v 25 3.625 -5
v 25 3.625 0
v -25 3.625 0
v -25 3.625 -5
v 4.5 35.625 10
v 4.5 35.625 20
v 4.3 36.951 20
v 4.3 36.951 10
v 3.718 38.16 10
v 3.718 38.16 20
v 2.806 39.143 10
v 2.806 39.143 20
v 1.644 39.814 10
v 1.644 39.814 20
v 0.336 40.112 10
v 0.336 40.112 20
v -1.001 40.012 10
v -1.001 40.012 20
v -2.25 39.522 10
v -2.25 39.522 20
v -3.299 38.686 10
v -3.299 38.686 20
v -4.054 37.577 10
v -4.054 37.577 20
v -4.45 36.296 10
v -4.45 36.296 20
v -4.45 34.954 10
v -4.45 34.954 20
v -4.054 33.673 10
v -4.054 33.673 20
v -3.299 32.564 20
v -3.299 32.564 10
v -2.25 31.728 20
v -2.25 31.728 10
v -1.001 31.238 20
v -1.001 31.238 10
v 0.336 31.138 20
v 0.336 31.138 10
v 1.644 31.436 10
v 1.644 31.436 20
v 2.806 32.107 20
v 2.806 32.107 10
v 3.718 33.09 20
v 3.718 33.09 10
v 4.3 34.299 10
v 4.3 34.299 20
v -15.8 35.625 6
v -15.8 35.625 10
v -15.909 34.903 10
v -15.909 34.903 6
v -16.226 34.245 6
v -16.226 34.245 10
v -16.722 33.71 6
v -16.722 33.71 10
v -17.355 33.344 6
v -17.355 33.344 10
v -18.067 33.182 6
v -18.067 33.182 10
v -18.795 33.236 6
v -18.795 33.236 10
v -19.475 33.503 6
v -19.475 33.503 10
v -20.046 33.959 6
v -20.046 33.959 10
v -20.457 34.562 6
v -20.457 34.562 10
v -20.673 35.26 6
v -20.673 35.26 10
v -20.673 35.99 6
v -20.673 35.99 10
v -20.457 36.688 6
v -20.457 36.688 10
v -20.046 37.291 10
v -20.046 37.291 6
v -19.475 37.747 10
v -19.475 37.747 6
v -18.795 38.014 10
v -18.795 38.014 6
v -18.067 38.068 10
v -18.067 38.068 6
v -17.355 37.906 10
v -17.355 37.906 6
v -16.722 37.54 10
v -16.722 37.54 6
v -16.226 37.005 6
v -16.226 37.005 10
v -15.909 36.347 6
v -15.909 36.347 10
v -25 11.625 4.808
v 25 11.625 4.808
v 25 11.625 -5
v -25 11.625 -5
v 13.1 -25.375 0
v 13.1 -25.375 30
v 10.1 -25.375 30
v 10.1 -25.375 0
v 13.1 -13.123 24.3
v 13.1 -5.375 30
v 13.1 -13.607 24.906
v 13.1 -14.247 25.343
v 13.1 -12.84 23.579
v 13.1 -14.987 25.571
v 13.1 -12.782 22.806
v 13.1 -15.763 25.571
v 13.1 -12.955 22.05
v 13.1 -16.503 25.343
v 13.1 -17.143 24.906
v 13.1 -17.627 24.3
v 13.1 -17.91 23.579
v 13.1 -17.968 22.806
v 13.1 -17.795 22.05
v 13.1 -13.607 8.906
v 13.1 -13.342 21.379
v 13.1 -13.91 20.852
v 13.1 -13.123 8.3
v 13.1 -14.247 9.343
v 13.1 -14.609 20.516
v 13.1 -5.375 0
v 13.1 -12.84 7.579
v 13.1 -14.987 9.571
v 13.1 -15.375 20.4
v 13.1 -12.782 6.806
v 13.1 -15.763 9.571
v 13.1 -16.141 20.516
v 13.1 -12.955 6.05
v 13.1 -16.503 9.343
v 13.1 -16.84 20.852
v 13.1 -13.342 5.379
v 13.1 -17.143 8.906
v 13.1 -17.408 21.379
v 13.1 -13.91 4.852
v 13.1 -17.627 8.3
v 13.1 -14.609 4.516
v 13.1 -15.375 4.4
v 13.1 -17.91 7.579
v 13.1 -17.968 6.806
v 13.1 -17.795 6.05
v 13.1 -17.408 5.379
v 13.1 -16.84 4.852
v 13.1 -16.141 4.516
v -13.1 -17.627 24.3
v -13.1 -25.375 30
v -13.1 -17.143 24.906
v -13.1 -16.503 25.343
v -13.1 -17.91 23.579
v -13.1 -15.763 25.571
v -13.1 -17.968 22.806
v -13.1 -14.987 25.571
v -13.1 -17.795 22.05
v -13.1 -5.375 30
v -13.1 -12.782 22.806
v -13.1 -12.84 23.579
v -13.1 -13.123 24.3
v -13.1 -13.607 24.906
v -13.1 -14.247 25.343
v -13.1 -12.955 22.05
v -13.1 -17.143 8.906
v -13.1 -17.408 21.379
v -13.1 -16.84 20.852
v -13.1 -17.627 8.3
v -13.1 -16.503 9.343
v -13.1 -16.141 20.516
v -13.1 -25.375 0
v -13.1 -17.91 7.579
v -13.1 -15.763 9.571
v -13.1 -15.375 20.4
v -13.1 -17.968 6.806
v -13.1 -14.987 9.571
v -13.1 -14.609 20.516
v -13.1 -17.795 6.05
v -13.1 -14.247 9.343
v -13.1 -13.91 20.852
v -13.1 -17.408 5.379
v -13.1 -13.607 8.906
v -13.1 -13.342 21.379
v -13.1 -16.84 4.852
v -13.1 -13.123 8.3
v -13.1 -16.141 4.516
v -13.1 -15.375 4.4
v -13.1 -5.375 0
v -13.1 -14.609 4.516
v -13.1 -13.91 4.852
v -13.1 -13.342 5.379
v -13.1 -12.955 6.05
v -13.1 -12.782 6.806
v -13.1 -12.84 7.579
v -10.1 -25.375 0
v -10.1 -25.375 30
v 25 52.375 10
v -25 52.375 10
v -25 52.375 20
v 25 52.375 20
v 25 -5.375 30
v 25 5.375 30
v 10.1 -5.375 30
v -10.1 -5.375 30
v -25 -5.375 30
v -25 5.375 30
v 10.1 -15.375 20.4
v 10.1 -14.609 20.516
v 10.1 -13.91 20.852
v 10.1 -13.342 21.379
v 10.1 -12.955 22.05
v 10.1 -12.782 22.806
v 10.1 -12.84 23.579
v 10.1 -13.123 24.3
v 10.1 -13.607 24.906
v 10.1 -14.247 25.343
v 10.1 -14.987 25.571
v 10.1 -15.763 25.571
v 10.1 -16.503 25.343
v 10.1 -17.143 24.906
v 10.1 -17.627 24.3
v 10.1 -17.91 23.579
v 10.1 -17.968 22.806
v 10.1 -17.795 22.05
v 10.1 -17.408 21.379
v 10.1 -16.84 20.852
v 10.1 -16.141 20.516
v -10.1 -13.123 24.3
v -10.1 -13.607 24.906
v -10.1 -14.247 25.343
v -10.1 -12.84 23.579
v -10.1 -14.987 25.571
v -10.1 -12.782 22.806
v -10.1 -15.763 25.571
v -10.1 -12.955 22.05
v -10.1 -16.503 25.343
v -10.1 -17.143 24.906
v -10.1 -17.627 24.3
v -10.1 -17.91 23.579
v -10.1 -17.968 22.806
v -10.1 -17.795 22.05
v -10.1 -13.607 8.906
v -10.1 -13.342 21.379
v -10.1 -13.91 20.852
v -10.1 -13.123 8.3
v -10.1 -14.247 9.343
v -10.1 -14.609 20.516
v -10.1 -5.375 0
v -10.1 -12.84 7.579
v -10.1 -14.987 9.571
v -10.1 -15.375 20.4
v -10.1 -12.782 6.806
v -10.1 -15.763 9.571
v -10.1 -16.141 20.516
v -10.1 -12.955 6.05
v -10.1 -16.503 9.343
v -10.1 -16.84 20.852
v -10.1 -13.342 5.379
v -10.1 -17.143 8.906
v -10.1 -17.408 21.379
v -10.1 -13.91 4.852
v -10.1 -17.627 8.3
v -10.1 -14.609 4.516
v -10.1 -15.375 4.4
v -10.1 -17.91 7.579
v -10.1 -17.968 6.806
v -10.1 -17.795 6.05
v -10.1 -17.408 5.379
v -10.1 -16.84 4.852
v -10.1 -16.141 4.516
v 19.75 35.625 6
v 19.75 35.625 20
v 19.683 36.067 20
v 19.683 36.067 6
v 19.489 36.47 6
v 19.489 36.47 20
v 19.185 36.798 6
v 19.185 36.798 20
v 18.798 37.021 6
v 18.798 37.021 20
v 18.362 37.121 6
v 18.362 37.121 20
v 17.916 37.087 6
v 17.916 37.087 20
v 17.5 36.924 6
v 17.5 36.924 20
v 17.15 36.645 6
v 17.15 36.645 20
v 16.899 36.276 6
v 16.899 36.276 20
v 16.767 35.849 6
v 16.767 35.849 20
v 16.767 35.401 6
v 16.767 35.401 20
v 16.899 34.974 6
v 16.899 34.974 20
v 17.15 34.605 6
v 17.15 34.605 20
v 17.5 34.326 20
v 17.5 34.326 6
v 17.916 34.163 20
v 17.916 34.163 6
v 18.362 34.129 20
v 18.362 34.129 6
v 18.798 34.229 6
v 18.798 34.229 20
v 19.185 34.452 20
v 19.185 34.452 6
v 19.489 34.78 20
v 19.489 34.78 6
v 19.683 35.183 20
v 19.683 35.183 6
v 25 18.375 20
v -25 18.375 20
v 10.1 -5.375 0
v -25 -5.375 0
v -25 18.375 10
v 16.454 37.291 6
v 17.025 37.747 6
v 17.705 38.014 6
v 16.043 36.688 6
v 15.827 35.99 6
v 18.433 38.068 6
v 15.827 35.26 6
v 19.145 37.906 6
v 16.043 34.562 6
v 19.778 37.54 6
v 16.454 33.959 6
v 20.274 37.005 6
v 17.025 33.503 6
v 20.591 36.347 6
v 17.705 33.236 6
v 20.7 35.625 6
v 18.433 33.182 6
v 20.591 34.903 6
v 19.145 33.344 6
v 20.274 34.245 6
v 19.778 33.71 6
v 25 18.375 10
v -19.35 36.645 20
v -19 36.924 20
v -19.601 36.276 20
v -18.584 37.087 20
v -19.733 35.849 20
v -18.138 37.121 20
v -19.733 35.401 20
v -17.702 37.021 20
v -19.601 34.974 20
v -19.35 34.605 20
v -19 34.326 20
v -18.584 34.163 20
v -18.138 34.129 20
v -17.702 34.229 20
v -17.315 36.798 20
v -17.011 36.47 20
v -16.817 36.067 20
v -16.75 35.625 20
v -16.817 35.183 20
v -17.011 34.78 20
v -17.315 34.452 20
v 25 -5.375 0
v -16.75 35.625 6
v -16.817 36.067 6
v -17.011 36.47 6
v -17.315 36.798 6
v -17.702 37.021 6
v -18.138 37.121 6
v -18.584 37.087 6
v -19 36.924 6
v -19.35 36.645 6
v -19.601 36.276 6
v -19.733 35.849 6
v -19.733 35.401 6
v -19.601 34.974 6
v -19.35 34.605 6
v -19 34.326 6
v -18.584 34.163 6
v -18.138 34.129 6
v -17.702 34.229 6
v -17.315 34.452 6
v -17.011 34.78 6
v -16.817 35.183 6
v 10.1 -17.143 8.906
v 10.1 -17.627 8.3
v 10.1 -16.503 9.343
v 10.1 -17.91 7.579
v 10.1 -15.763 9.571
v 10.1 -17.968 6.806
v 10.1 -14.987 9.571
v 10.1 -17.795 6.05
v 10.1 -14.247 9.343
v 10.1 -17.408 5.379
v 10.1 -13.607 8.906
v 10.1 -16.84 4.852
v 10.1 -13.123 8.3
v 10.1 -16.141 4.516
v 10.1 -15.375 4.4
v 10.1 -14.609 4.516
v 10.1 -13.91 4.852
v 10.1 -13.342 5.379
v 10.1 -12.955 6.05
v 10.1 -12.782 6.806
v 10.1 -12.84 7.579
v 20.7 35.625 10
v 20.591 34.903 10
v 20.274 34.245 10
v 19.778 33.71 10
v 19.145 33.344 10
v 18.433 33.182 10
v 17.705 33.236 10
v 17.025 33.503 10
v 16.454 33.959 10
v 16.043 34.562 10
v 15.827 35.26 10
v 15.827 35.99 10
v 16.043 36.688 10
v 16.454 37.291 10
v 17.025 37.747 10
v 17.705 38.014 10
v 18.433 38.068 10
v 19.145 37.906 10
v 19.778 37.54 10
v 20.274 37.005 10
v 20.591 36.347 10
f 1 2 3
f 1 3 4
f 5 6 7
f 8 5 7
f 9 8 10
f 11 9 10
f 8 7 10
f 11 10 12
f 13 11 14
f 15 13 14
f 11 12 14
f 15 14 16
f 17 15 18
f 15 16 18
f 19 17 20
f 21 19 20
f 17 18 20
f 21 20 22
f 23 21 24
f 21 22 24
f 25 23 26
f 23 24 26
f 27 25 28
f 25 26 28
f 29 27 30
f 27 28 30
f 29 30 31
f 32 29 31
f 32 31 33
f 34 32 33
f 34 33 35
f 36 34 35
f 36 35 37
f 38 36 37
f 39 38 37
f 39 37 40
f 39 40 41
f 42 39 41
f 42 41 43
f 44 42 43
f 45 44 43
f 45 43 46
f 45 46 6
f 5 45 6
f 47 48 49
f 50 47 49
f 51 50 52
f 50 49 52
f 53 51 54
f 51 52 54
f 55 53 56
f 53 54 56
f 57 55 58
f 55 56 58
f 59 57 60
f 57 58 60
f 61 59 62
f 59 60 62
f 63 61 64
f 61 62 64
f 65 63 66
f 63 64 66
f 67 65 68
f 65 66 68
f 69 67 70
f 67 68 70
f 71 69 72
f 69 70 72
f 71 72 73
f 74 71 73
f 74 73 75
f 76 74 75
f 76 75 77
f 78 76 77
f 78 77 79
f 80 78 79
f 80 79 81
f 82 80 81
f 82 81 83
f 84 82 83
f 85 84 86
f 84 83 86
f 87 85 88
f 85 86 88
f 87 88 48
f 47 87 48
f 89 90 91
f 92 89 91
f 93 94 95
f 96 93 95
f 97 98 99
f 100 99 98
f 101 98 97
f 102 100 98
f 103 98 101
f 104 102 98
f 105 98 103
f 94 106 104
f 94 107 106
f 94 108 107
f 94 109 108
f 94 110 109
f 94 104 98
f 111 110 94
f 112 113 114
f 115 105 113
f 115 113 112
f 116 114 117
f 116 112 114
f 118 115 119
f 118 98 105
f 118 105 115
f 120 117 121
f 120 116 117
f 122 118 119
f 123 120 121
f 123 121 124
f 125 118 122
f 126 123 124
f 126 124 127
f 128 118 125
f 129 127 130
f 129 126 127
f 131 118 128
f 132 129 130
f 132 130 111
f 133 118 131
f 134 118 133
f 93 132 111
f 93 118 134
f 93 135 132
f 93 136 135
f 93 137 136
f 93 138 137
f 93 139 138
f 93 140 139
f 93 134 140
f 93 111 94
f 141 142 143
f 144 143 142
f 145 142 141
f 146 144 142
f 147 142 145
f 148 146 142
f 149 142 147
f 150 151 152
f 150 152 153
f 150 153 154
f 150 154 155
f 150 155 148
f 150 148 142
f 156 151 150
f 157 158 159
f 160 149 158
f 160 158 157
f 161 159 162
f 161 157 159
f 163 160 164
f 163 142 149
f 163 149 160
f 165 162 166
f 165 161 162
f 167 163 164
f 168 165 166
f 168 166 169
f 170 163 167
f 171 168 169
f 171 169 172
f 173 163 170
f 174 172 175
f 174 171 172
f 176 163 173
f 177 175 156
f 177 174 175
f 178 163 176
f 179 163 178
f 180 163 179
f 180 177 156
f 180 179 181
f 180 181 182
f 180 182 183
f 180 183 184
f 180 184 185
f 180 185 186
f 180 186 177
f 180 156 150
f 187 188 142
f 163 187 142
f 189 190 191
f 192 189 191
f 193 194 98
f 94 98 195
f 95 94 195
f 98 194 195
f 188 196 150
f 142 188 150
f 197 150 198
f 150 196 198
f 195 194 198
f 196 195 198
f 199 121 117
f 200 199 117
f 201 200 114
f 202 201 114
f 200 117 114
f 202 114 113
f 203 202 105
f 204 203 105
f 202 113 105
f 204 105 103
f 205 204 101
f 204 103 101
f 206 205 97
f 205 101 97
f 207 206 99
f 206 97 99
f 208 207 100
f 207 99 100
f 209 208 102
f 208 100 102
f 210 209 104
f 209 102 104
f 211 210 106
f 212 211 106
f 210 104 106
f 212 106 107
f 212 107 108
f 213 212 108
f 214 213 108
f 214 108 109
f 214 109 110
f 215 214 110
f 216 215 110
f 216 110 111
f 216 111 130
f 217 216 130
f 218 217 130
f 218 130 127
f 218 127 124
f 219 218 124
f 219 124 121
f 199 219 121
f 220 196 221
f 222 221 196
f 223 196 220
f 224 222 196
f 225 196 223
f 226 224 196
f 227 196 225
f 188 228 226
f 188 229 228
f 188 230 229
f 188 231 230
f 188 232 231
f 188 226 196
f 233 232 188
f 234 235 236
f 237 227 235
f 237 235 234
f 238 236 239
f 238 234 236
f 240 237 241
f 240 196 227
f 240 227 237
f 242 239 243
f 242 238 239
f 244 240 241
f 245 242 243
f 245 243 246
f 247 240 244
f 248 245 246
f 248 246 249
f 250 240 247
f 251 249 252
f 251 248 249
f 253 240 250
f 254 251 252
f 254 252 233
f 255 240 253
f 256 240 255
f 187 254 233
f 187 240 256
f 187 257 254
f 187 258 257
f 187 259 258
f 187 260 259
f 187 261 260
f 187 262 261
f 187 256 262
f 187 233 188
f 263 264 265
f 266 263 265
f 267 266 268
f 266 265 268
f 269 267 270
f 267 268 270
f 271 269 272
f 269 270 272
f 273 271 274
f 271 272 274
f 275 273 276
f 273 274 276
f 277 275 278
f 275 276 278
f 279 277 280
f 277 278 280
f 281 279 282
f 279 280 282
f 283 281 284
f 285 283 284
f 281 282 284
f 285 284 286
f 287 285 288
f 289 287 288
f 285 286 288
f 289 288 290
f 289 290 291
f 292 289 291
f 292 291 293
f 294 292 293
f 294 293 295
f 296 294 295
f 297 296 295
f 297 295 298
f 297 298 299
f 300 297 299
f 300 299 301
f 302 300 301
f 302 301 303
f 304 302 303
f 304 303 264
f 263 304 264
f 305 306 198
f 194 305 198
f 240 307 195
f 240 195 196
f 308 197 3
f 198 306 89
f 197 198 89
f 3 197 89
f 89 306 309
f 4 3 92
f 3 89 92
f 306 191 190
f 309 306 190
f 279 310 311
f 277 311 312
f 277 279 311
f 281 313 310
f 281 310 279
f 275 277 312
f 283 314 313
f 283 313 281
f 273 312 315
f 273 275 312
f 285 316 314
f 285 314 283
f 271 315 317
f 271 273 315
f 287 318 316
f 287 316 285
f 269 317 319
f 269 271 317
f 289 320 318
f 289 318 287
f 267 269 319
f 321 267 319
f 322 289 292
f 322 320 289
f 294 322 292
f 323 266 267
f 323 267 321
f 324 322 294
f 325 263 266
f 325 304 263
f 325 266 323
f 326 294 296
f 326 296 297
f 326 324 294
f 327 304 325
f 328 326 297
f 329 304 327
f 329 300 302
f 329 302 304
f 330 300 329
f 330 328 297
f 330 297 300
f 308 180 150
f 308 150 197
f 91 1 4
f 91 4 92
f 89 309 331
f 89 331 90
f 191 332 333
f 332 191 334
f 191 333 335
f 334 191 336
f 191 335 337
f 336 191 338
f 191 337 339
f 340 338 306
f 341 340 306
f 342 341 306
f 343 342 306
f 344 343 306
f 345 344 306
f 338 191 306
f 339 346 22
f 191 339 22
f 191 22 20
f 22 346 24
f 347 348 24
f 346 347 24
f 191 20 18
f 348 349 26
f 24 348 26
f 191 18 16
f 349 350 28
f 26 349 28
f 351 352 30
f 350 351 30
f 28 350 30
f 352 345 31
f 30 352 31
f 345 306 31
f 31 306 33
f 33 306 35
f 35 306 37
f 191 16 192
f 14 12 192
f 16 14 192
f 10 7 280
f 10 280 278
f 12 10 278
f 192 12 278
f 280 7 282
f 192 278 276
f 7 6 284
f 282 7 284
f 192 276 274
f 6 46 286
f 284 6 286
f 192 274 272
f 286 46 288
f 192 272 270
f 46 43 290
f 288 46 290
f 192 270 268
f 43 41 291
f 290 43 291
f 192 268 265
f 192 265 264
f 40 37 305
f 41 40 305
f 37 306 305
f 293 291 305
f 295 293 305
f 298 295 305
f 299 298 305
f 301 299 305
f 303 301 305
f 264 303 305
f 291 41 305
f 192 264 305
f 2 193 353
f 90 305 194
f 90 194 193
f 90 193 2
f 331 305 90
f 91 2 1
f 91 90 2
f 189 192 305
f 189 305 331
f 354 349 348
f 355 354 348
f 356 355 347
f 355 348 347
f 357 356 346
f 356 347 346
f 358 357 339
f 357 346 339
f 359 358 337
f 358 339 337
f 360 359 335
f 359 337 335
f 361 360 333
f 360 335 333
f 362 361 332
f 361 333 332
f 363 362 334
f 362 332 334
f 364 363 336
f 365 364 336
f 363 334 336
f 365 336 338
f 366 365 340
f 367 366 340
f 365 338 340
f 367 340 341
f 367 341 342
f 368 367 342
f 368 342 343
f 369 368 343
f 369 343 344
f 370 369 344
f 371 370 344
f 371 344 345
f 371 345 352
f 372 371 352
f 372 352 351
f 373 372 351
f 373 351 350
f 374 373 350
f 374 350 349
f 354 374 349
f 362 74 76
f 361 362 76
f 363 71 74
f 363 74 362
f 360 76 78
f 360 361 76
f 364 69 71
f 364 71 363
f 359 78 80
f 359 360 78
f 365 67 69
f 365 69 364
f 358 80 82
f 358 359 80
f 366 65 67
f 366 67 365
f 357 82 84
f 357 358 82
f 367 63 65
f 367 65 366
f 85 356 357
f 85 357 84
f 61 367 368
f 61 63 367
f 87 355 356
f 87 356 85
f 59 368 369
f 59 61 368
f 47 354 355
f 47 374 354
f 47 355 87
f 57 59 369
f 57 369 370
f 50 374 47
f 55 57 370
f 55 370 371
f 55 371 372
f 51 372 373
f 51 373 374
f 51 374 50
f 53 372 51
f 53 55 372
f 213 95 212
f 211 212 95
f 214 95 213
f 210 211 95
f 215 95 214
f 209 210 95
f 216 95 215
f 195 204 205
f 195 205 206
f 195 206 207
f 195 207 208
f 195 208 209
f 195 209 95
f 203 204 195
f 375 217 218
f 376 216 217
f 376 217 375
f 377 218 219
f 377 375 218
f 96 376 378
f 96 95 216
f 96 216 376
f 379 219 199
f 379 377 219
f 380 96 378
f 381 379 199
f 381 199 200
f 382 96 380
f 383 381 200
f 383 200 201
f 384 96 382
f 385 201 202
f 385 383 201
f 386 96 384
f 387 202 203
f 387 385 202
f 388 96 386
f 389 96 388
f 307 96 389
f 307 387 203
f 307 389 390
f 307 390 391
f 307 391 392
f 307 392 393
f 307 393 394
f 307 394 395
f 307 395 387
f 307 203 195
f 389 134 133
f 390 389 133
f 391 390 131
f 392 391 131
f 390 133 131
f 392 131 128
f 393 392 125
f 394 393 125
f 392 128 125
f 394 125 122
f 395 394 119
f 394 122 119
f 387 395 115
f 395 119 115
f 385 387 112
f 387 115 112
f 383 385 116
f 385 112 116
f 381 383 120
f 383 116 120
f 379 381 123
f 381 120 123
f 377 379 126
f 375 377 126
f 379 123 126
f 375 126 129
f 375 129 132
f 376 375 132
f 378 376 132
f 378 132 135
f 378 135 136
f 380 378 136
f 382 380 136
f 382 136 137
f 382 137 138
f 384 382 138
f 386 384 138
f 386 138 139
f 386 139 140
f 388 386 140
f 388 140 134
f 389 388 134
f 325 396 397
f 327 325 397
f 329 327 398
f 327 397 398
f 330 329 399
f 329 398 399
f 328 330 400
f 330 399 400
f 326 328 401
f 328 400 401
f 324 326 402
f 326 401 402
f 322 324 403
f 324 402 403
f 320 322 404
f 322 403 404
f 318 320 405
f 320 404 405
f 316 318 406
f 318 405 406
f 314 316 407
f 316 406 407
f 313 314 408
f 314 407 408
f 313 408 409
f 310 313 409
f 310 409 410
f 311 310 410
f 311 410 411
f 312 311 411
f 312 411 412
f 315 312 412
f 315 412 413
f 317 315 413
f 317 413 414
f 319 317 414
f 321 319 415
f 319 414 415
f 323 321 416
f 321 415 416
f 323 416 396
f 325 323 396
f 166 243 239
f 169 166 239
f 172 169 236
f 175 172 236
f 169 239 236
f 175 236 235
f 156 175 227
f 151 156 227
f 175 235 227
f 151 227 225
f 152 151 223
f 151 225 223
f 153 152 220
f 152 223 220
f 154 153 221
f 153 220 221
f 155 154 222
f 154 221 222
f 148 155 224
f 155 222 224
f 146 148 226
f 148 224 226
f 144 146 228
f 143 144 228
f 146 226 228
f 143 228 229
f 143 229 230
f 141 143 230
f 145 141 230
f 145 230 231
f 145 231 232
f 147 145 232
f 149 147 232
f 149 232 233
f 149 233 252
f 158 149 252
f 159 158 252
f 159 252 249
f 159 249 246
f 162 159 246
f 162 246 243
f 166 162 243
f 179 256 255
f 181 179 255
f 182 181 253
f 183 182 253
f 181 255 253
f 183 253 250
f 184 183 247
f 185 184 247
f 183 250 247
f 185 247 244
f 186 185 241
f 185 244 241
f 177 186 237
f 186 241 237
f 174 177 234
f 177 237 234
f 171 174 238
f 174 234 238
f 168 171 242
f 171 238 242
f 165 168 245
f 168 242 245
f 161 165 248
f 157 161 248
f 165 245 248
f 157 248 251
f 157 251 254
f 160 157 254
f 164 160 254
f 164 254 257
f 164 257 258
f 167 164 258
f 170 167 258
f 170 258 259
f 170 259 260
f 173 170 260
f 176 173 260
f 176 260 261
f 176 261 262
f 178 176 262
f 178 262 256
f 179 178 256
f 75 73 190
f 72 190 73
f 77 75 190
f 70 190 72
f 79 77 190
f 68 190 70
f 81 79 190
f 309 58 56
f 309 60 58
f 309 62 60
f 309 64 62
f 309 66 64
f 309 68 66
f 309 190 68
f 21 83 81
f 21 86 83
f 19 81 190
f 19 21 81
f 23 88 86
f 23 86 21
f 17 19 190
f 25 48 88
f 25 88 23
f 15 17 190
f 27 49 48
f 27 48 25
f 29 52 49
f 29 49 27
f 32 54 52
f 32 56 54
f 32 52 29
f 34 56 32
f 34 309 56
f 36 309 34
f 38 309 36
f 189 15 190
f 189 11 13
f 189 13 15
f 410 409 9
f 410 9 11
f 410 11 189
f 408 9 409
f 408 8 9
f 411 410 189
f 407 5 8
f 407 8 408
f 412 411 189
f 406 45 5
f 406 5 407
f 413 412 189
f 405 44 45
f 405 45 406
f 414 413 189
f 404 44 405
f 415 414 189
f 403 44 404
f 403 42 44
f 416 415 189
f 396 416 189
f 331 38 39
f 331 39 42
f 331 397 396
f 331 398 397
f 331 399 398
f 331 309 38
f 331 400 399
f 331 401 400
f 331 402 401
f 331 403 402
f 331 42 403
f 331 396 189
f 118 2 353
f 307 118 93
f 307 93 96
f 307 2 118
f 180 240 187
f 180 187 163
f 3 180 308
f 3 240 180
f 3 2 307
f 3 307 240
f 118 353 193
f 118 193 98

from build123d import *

# Parameters (mm, degrees)
EXTRUDE_1_DEPTH     = 30
SKETCH_2_W          = 50
SKETCH_2_H          = 10
EXTRUDE_2_DEPTH     = 50
HOLE_WIZARD_2_D     = 5.2
HOLE_WIZARD_3_D     = 9
SKETCH_17_R         = 2.45
EXTRUDE_6_DEPTH     = 4
HOLE_WIZARD_5_D     = 3
EXTRUDE_7_DEPTH     = 50
SKETCH_21_W         = 10
SKETCH_21_H         = 3
CUT_EXTRUDE_1_DEPTH = 81.413870849
SKETCH_23_W         = 9.807692308
SKETCH_23_H         = 8
EXTRUDE_8_DEPTH     = 50


with BuildPart() as part:
    # 草图1 → 凸台-拉伸1 (new body)
    with BuildSketch(Plane.XY):
        Polygon((13.1, -5.375), (13.1, -25.375), (10.1, -25.375), (10.1, -5.375), (-10.1, -5.375), (-10.1, -25.375), (-13.1, -25.375), (-13.1, -5.375), (-25, -5.375), (-25, 5.375), (25, 5.375), (25, -5.375), align=None)
    extrude(amount=EXTRUDE_1_DEPTH)

    # 草图2 → 凸台-拉伸2 (add)
    with BuildSketch(Plane(origin=(0, 5.375, 0), x_dir=(1, 0, 0), z_dir=(0, 1, 0))):
        with Locations((0, -15)):
            Rectangle(SKETCH_2_W, SKETCH_2_H)
    extrude(amount=EXTRUDE_2_DEPTH)

    # 孔2 (through all)
    with Locations(Plane.ZY.offset(13.1)):
        with Locations((7, -15.375), (23, -15.375)):
            Hole(HOLE_WIZARD_2_D / 2)

    # 孔3 (through all)
    with Locations(Plane(origin=(0, 0, 10), x_dir=(-1, 0, 0), z_dir=(0, 0, -1))):
        with Locations((0, 35.625)):
            Hole(HOLE_WIZARD_3_D / 2)

    # 草图17 → 凸台-拉伸6 (add)
    with BuildSketch(Plane(origin=(0, 0, 10), x_dir=(-1, 0, 0), z_dir=(0, 0, -1))):
        with Locations(Location((18.25, 35.625, 0), (0, 0, 180))):
            Circle(SKETCH_17_R)
        with Locations(Location((-18.25, 35.625, 0), (0, 0, 180))):
            Circle(SKETCH_17_R)
    extrude(amount=EXTRUDE_6_DEPTH)

    # 孔5 (through all)
    with Locations(Plane(origin=(0, 0, 6), x_dir=(-1, 0, 0), z_dir=(0, 0, -1))):
        with Locations((18.25, 35.625), (-18.25, 35.625)):
            Hole(HOLE_WIZARD_5_D / 2)

    # 草图20 → 凸台-拉伸7 (add)
    with BuildSketch(Plane.ZY.offset(25)):
        Polygon((20, 18.375), (30, 5.375), (20, 5.375), align=None)
        Polygon((10, 18.375), (0, 5.375), (10, 5.375), align=None)
    extrude(amount=-EXTRUDE_7_DEPTH)

    # 草图21 → 切除-拉伸1 (cut, through all)
    with BuildSketch(Plane.ZY.offset(25)):
        with Locations((15, 53.875)):
            Rectangle(SKETCH_21_W, SKETCH_21_H)
    extrude(amount=-CUT_EXTRUDE_1_DEPTH, mode=Mode.SUBTRACT)

    # 草图23 → 凸台-拉伸8 (add)
    with BuildSketch(Plane(origin=(25, 0, 0), x_dir=(0, 0, -1), z_dir=(1, 0, 0))):
        with Locations((0.096153846, 7.625)):
            Rectangle(SKETCH_23_W, SKETCH_23_H)
    extrude(amount=-EXTRUDE_8_DEPTH)


solid = part.part
